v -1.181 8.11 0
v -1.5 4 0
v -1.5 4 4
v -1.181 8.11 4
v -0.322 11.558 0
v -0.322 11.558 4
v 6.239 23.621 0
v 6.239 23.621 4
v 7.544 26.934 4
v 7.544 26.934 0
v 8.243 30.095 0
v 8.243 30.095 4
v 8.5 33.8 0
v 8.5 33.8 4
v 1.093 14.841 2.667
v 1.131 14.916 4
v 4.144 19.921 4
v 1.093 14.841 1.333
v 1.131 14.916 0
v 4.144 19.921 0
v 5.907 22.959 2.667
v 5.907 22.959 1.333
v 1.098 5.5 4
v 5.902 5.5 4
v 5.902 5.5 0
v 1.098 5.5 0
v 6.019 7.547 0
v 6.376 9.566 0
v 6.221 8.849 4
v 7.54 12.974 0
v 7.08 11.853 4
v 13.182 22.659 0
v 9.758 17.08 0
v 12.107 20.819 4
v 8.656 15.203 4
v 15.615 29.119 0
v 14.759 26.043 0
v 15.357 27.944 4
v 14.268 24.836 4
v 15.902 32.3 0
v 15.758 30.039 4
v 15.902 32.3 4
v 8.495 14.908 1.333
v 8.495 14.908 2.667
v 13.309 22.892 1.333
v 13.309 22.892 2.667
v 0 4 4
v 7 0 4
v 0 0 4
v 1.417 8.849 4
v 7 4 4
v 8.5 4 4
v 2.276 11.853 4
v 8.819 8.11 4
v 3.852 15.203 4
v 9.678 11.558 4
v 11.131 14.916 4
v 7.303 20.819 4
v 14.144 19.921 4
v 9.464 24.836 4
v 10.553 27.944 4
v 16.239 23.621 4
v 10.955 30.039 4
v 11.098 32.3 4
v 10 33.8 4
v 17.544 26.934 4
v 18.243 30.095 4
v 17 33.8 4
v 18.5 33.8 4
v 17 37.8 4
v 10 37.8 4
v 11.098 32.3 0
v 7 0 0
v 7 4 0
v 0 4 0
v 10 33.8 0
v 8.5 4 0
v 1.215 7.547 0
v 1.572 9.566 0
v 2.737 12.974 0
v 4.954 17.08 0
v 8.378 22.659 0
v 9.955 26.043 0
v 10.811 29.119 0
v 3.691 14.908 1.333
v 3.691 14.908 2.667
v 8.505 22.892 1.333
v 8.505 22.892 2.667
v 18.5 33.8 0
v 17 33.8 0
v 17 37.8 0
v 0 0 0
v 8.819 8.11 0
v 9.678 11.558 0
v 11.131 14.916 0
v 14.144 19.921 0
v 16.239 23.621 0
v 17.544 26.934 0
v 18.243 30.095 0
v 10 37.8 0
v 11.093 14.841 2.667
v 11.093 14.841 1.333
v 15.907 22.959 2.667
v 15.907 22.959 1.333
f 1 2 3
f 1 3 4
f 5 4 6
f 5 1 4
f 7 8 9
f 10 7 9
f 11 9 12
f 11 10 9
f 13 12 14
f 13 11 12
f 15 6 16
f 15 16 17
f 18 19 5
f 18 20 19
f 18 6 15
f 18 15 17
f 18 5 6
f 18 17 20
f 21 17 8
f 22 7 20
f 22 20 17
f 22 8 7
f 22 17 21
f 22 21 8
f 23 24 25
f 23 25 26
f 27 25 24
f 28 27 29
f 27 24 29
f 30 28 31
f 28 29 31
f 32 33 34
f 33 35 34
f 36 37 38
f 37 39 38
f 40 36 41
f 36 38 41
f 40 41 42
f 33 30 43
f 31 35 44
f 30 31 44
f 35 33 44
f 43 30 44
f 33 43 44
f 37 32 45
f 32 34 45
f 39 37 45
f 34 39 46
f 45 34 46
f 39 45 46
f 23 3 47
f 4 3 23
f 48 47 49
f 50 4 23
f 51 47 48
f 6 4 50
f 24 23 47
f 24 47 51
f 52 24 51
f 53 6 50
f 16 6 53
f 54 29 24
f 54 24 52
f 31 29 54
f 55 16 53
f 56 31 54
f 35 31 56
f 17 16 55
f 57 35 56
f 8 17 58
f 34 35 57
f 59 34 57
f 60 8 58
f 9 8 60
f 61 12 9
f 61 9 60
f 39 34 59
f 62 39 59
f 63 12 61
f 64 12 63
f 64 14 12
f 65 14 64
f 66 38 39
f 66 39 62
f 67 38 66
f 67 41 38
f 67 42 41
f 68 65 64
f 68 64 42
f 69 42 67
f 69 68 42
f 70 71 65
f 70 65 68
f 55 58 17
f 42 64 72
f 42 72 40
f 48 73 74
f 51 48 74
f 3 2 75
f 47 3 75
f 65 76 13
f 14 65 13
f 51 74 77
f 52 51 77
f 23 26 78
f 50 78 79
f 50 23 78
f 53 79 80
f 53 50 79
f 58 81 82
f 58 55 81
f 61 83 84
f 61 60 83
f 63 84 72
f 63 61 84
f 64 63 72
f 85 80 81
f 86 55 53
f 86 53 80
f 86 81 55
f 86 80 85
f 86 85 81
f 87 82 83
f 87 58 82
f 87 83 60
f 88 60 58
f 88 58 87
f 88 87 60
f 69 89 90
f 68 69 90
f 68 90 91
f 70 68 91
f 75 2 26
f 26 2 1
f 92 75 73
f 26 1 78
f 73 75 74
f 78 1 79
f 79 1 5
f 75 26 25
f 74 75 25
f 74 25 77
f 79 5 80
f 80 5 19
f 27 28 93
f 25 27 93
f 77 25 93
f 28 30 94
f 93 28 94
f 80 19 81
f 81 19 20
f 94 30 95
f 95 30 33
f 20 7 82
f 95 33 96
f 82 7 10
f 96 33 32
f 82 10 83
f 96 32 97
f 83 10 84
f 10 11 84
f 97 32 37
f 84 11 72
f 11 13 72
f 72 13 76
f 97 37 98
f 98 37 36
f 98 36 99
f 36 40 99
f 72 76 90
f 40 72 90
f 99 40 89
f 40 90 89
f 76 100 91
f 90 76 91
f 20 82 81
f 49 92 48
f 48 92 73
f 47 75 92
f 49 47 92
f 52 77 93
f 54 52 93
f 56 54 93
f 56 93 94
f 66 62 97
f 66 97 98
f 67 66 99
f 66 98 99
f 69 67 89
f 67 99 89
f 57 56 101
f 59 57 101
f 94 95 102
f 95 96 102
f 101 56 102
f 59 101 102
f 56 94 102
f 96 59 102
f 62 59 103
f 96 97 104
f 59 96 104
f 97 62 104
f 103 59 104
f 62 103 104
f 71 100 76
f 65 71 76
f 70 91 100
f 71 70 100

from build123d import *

# Parameters (mm, degrees)
BOSS_EXTRU_1_DEPTH      = 4
ENL_V_MAT_EXTRU_1_REACH = 44.274


with BuildPart() as part:
    # Esquisse1 → Boss.-Extru.1 (new body)
    with BuildSketch(Plane.XY):
        with BuildLine():
            Line((0, 0), (7, 0))
            Line((7, 0), (7, 4))
            Line((7, 4), (8.5, 4))
            add(Edge.make_bspline(
                [(8.5, 4), (8.5, 18.018365096), (18.5, 19.781634904), (18.5, 33.8)],
                knots=[0, 0, 0, 0, 1, 1, 1, 1], degree=3))
            Line((18.5, 33.8), (17, 33.8))
            Line((17, 33.8), (17, 37.8))
            Line((17, 37.8), (10, 37.8))
            Line((10, 37.8), (10, 33.8))
            Line((10, 33.8), (8.5, 33.8))
            add(Edge.make_bspline(
                [(-1.5, 4), (-1.5, 18.018365096), (8.5, 19.781634904), (8.5, 33.8)],
                knots=[0, 0, 0, 0, 1, 1, 1, 1], degree=3))
            Line((-1.5, 4), (0, 4))
            Line((0, 4), (0, 0))
        make_face()
    extrude(amount=BOSS_EXTRU_1_DEPTH)

    # Esquisse2 → Enlèv. mat.-Extru.1 (cut, up to next)
    with BuildSketch(Plane.XY.offset(4), mode=Mode.PRIVATE) as enl_v_mat_extru_1_sk1:
        with BuildLine():
            Line((11.098076211, 32.3), (15.901923789, 32.3))
            add(Edge.make_bspline(
                [(5.901923789, 5.5), (5.901923789, 16.568461709), (15.901923789, 21.231538291), (15.901923789, 32.3)],
                knots=[0, 0, 0, 0, 1, 1, 1, 1], degree=3))
            Line((5.901923789, 5.5), (1.098076211, 5.5))
            add(Edge.make_bspline(
                [(1.098076211, 5.5), (1.098076211, 16.568461709), (11.098076211, 21.231538291), (11.098076211, 32.3)],
                knots=[0, 0, 0, 0, 1, 1, 1, 1], degree=3))
        make_face()
    enl_v_mat_extru_1_tool1 = extrude(enl_v_mat_extru_1_sk1.sketch, amount=-ENL_V_MAT_EXTRU_1_REACH, mode=Mode.PRIVATE) & part.part
    add(enl_v_mat_extru_1_tool1.solids().sort_by_distance((8.5, 18.9, 4))[0], mode=Mode.SUBTRACT)


solid = part.part
